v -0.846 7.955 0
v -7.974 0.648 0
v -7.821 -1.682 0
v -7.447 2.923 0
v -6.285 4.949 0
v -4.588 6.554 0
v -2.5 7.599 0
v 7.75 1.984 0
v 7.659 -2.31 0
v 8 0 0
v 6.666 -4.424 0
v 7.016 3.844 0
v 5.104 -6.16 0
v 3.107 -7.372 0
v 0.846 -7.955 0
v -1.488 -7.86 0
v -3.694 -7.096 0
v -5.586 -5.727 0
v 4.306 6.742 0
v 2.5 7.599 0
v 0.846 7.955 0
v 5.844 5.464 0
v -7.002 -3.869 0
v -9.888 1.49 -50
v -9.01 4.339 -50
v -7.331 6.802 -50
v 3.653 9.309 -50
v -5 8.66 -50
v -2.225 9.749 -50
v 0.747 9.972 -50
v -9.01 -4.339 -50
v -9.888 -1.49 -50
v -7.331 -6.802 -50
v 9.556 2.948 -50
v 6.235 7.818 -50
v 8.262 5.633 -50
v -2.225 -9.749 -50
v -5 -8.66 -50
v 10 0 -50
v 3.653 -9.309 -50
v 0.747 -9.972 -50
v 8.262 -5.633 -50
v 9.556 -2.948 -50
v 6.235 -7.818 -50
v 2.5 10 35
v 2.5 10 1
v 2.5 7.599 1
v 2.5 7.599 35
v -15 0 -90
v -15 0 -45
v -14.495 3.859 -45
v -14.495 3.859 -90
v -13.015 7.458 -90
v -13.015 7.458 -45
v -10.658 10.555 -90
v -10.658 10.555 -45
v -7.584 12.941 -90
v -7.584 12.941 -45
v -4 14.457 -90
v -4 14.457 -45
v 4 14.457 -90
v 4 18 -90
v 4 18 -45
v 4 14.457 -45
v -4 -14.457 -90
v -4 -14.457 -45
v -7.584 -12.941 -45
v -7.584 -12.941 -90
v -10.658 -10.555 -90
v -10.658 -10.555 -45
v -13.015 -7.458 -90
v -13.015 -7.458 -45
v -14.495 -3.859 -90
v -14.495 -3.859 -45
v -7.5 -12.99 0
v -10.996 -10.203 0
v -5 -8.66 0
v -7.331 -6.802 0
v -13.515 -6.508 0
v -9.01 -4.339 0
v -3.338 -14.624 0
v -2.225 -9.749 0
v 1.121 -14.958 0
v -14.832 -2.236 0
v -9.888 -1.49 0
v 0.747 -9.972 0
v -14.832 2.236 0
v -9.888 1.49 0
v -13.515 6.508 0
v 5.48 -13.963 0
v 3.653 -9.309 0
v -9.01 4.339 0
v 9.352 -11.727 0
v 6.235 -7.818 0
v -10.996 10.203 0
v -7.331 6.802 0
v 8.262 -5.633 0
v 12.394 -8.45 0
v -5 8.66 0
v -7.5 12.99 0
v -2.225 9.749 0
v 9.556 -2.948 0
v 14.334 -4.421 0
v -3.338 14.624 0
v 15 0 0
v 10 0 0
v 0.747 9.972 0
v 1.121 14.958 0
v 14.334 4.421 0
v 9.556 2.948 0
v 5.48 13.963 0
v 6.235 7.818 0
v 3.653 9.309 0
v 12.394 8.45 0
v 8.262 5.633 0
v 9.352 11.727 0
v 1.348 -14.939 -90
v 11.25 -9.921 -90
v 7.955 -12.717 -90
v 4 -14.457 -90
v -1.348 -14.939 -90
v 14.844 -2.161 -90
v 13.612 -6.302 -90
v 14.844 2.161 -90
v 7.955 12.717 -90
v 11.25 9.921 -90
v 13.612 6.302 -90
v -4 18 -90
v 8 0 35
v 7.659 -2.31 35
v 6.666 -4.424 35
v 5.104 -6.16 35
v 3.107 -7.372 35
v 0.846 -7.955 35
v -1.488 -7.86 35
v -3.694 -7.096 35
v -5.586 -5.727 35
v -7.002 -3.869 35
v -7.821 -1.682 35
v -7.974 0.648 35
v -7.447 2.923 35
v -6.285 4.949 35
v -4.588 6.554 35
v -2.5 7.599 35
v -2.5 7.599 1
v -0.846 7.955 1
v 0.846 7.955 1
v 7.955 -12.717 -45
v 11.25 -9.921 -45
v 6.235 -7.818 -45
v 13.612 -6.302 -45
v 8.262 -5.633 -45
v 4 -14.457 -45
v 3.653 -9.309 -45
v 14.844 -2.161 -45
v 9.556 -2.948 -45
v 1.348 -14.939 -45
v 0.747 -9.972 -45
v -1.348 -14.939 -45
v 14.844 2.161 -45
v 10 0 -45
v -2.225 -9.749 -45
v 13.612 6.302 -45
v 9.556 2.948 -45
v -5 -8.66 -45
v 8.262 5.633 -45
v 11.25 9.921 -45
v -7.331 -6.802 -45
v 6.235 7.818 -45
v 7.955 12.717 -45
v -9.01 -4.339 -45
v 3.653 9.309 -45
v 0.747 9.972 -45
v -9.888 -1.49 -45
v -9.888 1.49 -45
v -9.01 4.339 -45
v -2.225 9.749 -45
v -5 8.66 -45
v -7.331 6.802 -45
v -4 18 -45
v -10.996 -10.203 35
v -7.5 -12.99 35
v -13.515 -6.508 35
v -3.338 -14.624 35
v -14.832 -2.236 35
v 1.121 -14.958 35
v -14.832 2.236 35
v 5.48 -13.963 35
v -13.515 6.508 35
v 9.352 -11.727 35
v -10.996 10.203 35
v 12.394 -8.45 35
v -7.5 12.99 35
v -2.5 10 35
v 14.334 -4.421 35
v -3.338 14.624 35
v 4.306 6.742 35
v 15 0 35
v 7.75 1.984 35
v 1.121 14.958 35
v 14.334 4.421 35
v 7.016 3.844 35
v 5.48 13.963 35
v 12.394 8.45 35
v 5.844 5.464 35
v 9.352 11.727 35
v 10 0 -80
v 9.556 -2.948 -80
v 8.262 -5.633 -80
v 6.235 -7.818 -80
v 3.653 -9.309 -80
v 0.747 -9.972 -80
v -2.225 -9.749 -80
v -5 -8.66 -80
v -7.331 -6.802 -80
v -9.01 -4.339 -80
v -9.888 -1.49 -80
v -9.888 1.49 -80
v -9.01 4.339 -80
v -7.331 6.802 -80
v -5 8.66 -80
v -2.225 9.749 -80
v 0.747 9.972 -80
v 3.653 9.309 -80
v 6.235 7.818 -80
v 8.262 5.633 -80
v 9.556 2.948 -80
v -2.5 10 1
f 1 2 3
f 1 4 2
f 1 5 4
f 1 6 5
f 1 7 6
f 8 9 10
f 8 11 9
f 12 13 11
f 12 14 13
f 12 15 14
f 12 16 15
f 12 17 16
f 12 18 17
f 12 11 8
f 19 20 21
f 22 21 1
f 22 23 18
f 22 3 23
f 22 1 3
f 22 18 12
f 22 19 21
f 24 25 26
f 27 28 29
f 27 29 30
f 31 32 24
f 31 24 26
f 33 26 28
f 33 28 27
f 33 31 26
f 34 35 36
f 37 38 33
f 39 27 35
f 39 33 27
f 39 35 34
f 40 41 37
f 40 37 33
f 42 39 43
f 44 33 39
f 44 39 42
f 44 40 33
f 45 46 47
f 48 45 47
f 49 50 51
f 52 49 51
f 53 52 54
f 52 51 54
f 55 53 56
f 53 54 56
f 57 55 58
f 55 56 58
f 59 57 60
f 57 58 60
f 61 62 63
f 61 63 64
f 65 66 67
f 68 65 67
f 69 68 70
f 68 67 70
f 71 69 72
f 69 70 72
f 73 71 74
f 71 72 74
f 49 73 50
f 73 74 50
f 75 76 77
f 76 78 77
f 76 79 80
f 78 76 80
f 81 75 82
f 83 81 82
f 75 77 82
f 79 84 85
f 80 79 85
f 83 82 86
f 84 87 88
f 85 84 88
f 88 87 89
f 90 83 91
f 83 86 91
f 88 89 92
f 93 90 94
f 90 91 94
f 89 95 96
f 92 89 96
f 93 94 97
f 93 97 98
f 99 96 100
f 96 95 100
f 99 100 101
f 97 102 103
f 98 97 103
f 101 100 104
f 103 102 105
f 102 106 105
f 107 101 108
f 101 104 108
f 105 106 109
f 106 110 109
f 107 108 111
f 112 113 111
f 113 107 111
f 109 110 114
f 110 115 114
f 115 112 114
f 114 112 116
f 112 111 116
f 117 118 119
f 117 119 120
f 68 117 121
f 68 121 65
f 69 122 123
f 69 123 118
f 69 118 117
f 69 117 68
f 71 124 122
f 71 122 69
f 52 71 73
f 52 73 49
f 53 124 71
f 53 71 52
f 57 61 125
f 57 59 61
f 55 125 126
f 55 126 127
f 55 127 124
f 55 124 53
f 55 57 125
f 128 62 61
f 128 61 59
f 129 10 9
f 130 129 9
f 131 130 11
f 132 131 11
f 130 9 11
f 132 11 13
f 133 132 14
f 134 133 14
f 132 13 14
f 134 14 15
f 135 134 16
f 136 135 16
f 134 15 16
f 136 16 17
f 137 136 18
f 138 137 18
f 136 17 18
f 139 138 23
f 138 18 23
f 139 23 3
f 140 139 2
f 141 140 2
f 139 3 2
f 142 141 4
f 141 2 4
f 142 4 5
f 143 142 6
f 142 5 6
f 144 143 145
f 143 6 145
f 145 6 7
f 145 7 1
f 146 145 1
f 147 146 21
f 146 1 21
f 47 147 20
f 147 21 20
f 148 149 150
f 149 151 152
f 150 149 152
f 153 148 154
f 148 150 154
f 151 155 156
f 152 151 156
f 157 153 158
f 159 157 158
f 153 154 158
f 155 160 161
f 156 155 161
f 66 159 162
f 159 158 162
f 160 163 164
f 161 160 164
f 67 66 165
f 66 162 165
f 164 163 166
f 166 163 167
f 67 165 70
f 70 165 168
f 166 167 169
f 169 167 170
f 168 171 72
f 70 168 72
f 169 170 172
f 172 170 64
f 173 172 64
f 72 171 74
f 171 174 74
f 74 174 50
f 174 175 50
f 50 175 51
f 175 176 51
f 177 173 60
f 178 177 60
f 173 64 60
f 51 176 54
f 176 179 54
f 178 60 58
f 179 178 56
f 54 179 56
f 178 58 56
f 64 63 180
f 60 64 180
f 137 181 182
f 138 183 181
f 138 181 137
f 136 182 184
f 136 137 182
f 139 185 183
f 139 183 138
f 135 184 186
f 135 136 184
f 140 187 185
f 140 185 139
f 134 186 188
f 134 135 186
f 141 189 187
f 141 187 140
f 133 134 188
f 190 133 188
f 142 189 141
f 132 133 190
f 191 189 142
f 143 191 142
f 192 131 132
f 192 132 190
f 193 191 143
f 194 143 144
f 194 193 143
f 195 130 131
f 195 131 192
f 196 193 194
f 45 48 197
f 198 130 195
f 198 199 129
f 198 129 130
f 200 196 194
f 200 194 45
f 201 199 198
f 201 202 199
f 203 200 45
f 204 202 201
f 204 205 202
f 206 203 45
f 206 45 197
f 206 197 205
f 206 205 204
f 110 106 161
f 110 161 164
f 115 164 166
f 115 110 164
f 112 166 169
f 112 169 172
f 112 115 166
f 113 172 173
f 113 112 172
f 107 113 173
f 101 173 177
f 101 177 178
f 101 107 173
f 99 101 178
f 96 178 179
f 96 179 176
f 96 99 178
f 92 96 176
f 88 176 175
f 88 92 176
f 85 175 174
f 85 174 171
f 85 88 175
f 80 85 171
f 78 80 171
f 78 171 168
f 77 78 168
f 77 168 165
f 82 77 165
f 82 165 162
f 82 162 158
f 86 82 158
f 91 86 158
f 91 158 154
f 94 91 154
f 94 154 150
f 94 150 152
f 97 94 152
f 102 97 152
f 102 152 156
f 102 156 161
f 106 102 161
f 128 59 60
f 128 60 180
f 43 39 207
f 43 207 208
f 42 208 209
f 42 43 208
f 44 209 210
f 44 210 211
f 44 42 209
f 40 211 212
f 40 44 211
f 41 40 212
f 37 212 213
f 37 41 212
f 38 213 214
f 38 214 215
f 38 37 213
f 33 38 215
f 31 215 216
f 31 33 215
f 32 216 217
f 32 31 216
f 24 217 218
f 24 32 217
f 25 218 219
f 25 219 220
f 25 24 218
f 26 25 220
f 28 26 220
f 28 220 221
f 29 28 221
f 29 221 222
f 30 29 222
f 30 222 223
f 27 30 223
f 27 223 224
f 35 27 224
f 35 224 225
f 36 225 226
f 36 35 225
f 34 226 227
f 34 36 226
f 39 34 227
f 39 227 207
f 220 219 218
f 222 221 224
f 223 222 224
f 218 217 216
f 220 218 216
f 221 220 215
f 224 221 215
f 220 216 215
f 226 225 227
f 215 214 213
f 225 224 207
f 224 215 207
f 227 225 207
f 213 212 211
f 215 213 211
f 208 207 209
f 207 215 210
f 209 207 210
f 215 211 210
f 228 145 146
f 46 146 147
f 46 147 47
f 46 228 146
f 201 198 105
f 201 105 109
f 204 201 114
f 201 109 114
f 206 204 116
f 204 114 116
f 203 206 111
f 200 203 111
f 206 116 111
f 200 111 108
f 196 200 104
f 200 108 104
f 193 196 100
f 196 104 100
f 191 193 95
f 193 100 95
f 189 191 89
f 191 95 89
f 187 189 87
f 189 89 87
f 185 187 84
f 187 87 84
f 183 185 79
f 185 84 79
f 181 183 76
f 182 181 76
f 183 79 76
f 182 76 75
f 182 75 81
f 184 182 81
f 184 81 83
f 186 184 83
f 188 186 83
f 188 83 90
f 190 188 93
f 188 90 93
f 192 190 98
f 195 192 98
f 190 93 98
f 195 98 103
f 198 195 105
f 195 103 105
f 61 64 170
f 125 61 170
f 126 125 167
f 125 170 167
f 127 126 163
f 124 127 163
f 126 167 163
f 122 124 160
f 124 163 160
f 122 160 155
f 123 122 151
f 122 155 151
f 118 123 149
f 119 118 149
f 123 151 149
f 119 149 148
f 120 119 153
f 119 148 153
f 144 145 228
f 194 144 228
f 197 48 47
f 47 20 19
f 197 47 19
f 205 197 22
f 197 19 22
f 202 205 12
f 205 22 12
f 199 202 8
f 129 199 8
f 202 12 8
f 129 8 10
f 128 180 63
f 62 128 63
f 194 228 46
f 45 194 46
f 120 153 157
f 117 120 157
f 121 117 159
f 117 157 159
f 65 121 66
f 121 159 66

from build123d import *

# Parameters (mm, degrees)
SKETCH1_R                = 15
BOSS_EXTRUDE1_DEPTH      = 35
BOSS_EXTRUDE3_DEPTH      = 1
SKETCH2_R                = 10
BOSS_EXTRUDE4_DEPTH      = 50
BOSS_EXTRUDE5_DEPTH      = 40
BOSS_EXTRUDE5_DEPTH_BACK = 5
SKETCH4_R                = 10
CUT_EXTRUDE2_DEPTH       = 30


with BuildPart() as part:
    # Sketch1 → Boss-Extrude1 (new body)
    with BuildSketch(Plane.XY):
        Circle(SKETCH1_R)
        with BuildLine():
            Line((-2.5, 10), (2.5, 10))
            Line((2.5, 10), (2.5, 7.599342077))
            ThreePointArc((2.5, 7.599342077), (6.480740698, 4.69041576), (8, 0))
            ThreePointArc((8, 0), (-4.69041576, -6.480740698), (-2.5, 7.599342077))
            Line((-2.5, 7.599342077), (-2.5, 10))
        make_face(mode=Mode.SUBTRACT)
    extrude(amount=BOSS_EXTRUDE1_DEPTH)

    # Sketch1<6> → Boss-Extrude3 (add)
    with BuildSketch(Plane.XY):
        with BuildLine():
            Line((2.5, 7.599342077), (2.5, 10))
            Line((2.5, 10), (-2.5, 10))
            Line((-2.5, 10), (-2.5, 7.599342077))
            ThreePointArc((-2.5, 7.599342077), (0, 8), (2.5, 7.599342077))
        make_face()
    extrude(amount=BOSS_EXTRUDE3_DEPTH)

    # Sketch2 → Boss-Extrude4 (add)
    with BuildSketch(Plane.XY):
        Circle(SKETCH2_R)
    extrude(amount=-BOSS_EXTRUDE4_DEPTH)

    # Sketch3 → Boss-Extrude5 (add, two sides: drawn at the far end of the back side and taken through both)
    with BuildSketch(Plane(origin=(0, 0, -50), x_dir=(-1, 0, 0), z_dir=(0, 0, -1)).offset(-BOSS_EXTRUDE5_DEPTH_BACK)):
        with BuildLine():
            Line((4, 18), (-4, 18))
            Line((-4, 18), (-4, 14.456832295))
            ThreePointArc((-4, 14.456832295), (0, -15), (4, 14.456832295))
            Line((4, 14.456832295), (4, 18))
        make_face()
    extrude(amount=BOSS_EXTRUDE5_DEPTH + BOSS_EXTRUDE5_DEPTH_BACK)

    # Sketch4 → Cut-Extrude2 (cut)
    with BuildSketch(Plane(origin=(0, 0, -50), x_dir=(-1, 0, 0), z_dir=(0, 0, -1))):
        Circle(SKETCH4_R)
    extrude(amount=CUT_EXTRUDE2_DEPTH, mode=Mode.SUBTRACT)


solid = part.part
